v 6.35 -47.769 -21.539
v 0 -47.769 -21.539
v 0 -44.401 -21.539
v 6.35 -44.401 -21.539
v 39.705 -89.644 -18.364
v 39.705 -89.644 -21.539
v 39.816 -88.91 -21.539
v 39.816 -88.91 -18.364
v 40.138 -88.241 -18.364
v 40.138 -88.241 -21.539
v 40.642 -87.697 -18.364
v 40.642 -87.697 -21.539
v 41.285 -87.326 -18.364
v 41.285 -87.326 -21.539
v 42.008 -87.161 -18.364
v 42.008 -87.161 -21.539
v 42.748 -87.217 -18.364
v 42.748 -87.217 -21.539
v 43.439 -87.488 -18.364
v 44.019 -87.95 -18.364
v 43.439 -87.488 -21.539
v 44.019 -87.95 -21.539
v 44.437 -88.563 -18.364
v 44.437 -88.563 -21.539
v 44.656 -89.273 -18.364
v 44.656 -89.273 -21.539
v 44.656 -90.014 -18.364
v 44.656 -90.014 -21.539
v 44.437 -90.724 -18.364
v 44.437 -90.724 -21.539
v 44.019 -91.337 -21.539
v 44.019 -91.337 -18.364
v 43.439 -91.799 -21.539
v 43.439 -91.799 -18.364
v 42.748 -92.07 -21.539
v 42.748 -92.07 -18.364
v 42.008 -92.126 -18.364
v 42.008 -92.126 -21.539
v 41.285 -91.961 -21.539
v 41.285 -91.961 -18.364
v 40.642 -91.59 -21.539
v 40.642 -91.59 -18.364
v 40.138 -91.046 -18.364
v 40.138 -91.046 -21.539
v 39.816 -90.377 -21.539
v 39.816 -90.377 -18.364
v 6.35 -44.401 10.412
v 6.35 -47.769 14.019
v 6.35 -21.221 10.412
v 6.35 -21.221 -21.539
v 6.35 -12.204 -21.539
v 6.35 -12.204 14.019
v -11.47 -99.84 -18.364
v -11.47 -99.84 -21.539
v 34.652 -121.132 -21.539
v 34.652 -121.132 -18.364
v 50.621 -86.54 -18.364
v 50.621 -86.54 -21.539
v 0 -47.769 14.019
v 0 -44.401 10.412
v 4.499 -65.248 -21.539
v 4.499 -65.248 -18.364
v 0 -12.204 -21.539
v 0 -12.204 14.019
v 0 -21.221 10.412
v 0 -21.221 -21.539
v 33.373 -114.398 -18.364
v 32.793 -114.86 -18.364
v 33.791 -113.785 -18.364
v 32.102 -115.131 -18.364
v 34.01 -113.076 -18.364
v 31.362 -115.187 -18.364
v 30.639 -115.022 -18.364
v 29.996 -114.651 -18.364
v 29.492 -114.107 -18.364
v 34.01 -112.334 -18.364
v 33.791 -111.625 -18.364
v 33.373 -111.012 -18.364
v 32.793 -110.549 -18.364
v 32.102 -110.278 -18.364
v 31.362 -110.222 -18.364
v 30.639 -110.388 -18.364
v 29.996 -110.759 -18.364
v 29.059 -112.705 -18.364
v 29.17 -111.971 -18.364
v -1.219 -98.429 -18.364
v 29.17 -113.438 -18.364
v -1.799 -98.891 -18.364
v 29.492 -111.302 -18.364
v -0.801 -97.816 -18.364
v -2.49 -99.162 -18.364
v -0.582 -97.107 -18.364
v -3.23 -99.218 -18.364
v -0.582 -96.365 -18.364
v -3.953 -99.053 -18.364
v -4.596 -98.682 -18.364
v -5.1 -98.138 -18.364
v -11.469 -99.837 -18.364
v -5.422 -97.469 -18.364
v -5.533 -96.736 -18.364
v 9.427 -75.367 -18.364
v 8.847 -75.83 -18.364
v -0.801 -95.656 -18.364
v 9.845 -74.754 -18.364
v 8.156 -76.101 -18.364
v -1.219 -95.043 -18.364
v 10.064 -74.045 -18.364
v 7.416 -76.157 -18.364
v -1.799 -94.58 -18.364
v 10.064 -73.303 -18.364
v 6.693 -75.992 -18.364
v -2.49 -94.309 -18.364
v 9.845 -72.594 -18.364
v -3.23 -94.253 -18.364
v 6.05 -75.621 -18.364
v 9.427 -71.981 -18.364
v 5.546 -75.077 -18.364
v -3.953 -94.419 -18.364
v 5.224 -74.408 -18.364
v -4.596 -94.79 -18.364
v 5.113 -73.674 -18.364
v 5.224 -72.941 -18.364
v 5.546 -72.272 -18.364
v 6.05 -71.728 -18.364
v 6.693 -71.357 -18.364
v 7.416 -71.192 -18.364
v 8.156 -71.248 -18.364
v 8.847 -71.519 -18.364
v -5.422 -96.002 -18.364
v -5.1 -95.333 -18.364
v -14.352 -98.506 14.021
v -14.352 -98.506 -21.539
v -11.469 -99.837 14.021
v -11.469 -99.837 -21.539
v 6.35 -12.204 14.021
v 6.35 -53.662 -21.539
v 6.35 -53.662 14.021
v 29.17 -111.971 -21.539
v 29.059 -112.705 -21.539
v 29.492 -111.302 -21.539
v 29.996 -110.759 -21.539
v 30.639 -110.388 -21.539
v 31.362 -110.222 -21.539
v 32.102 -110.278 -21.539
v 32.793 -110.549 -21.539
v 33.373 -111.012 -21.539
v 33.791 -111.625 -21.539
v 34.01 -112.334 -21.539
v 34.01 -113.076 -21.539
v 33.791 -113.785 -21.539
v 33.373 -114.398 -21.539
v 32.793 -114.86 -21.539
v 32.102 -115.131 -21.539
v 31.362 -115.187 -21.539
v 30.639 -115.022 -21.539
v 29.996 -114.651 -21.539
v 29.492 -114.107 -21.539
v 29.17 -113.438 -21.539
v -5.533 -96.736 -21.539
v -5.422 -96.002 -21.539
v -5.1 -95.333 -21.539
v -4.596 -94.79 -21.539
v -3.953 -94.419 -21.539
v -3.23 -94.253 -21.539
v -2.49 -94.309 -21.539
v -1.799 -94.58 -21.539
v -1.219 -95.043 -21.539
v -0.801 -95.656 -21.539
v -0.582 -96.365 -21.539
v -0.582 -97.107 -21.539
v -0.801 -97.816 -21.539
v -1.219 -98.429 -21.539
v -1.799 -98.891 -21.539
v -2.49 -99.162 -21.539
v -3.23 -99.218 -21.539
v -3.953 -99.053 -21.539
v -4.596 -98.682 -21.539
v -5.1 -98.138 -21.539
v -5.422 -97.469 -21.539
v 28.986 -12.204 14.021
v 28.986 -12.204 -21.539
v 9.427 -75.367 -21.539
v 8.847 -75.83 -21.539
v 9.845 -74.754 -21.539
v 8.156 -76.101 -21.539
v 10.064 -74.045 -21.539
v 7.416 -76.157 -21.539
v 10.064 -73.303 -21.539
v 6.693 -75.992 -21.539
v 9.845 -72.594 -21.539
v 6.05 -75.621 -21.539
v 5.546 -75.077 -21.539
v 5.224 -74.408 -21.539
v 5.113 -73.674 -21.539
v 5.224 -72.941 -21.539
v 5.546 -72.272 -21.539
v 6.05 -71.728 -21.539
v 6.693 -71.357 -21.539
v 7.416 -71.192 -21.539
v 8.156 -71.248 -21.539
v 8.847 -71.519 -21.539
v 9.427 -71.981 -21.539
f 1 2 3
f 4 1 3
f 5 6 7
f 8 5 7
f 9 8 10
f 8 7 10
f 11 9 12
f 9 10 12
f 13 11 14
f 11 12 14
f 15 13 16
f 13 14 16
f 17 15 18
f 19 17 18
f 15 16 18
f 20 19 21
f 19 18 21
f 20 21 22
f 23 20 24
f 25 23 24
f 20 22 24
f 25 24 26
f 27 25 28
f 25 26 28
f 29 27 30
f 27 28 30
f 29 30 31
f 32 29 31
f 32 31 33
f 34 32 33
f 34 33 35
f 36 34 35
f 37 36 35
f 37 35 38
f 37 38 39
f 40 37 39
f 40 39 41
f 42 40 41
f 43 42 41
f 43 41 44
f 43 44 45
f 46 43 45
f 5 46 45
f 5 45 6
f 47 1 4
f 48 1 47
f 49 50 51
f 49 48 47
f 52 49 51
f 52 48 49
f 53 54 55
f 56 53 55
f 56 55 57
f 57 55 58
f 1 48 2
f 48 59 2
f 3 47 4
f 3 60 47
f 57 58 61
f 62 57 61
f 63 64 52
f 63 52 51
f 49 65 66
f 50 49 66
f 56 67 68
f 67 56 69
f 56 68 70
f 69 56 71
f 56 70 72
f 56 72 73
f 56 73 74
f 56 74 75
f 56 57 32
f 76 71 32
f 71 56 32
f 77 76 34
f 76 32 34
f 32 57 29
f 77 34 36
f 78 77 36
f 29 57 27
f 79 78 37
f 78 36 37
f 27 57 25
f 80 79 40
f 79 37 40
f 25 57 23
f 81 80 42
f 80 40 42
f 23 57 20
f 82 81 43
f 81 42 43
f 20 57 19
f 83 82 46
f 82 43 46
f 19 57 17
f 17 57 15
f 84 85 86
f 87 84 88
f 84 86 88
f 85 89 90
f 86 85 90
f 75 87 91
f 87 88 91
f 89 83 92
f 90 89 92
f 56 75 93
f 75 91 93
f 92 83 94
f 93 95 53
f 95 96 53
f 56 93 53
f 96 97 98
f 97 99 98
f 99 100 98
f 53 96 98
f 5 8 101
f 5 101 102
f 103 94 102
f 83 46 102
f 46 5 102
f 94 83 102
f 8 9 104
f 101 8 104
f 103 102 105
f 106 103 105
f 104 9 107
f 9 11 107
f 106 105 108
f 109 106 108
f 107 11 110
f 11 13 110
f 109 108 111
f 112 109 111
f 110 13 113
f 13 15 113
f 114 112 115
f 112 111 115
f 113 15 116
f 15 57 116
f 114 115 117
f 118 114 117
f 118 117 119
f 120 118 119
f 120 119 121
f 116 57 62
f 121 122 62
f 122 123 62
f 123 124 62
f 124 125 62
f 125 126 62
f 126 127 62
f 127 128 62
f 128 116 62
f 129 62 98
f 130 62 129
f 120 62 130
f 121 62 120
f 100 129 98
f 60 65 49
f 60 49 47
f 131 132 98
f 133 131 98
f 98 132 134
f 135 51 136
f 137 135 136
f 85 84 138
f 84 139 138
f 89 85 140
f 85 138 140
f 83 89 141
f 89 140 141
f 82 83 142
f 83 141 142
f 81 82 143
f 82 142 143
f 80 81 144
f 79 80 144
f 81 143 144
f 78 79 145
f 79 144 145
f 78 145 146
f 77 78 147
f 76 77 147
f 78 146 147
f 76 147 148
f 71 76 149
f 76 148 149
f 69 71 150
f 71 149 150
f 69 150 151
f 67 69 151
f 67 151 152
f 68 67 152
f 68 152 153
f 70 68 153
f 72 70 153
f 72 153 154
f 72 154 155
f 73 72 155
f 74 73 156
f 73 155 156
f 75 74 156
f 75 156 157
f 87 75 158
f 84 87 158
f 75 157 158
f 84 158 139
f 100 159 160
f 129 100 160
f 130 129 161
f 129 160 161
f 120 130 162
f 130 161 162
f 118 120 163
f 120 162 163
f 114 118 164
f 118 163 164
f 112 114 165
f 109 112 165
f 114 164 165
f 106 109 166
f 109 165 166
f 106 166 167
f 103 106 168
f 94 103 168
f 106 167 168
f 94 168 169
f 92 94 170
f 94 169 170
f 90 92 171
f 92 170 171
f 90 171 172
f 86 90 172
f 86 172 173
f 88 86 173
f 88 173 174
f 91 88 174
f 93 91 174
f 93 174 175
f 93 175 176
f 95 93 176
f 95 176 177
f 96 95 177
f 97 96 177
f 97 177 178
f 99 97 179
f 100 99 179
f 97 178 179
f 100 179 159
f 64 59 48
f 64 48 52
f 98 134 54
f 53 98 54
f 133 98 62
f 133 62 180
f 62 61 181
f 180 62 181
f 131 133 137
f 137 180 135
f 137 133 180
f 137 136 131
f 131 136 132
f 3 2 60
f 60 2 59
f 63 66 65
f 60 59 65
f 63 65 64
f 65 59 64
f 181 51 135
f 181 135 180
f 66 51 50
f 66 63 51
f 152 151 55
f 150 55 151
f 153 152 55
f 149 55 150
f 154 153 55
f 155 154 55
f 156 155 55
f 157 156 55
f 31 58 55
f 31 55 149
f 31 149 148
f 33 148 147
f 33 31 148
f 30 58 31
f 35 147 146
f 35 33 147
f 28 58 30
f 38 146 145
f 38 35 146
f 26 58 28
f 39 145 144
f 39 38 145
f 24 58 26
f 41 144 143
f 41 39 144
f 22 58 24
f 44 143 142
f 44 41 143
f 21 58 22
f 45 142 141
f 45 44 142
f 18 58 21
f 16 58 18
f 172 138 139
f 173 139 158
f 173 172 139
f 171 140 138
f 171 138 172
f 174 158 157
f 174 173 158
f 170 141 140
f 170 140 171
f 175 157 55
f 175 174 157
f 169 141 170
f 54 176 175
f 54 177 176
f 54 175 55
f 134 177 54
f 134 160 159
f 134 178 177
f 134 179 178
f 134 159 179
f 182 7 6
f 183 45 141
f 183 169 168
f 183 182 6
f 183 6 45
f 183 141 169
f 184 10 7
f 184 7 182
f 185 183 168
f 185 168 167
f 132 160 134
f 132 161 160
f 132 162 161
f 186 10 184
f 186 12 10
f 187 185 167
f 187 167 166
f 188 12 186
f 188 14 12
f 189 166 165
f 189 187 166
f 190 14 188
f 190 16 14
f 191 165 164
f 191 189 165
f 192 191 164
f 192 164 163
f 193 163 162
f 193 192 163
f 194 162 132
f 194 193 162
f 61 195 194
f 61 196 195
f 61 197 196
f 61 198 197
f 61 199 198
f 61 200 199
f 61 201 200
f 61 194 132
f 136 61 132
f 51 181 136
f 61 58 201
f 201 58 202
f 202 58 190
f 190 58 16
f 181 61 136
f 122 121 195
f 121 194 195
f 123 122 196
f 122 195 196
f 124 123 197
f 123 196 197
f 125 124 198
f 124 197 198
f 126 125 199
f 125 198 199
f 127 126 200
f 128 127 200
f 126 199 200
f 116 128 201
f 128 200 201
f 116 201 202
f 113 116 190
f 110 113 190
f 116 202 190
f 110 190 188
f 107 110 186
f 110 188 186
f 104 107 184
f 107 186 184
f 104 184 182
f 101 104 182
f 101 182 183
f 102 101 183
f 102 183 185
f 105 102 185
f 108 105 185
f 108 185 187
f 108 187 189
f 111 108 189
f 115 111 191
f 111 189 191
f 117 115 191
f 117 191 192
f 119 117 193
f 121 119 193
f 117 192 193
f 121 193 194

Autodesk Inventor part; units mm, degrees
ref_plane "YZ Plane" through (0, 0, 0) normal (1, 0, 0) x (0, 1, 0)
ref_plane "XZ Plane" through (0, 0, 0) normal (0, 1, 0) x (-1, 0, 0)
ref_plane "XY Plane" through (0, 0, 0) normal (0, 0, 1) x (1, 0, 0)
sketch "Sketch1" plane through (0, 0, 0) normal (1, 0, 0) x (0, 1, 0)
  line L0 (-12.2044, 14.0187) -> (-12.2044, -21.5388)
  line L1 (-12.2044, -21.5388) -> (-21.2212, -21.5388)
  line L2 (-21.2212, -16.1112) -> (-21.2212, 10.4119)
  line L3 (-21.2212, 14.0187) -> (-12.2044, 14.0187)
  line L4 (-47.769, -16.1112) -> (-47.769, -21.5388)
  line L5 (-47.769, -21.5388) -> (-44.4011, -21.5388)
  line L6 (-47.769, -16.1112) -> (-47.769, 14.0187)
  line L7 (-47.769, 14.0187) -> (-44.4011, 14.0187)
  line L8 (-44.4011, 10.4119) -> (-44.4011, -16.1112)
  line L9 (-21.2212, -16.1112) -> (-21.2212, -21.5388)
  line L10 (-44.4011, -16.1112) -> (-44.4011, -21.5388)
  line L11 (-21.2212, 10.4119) -> (-44.4011, 10.4119)
  line L12 (-44.4011, 14.0187) -> (-21.2212, 14.0187)
extrude "Extrusion1" add sketch "Sketch1" along normal blind 6.35
sketch "Sketch3" plane through (0, -21.2212, -21.5388) normal (0, 0, -1) x (-1, 0, 0)
  line L0 (-6.3501, 9.0172) -> (-6.3501, -26.5428)
  line L1 (-6.3501, -26.5428) -> (-6.3501, -32.4404)
  line L2 (-6.3501, -32.4404) -> (14.3519, -77.2848)
  line L3 (-6.3501, -32.4404) -> (43.0421, -32.4404) construction
  line L4 (-6.3501, 9.0172) -> (-28.9857, 9.0172)
  line L5 (14.3519, -77.2848) -> (11.4692, -78.6156)
  line L6 (11.4692, -78.6156) -> (-28.9857, 9.0172)
  dimension "d29" = 96.52
  dimension "d30" = 22.6355
  dimension "d31" = 35.56
extrude "Extrusion2" add sketch "Sketch3" against normal blind 35.56
sketch "Sketch4" plane through (0, -21.2212, -21.5388) normal (0, 0, -1) x (-1, 0, 0)
  line L0 (11.4705, -78.6183) -> (-34.652, -99.9104)
  line L1 (11.4705, -78.6183) -> (62.2705, -78.6183) construction
  line L2 (-34.652, -99.9104) -> (-50.6211, -65.3185)
  line L3 (-50.6211, -65.3185) -> (-4.4986, -44.0264)
  line L4 (-4.4986, -44.0264) -> (11.4705, -78.6183)
  line L5 (-50.6211, -65.3185) -> (-47.3708, -72.3592)
  circle A0 centre (-42.1943, -68.4223) radius 2.4892
  circle A1 centre (-7.6024, -52.4532) radius 2.4892
  circle A2 centre (3.0437, -75.5145) radius 2.4892
  circle A3 centre (-31.5482, -91.4835) radius 2.4892
  dimension "d15" = 50.8
  dimension "d16" = 155.22
  dimension "d17" = 38.1
  dimension "d25" = 4.9784
  dimension "d26" = 4.9784
  dimension "d27" = 4.9784
  dimension "d28" = 4.9784
  dimension "d32" = 6.35
  dimension "d34" = 6.35
  dimension "d35" = 6.35
  dimension "d37" = 6.35
  dimension "d38" = 6.35
  dimension "d40" = 6.35
  dimension "d42" = 6.35
  dimension "d44" = 6.35
extrude "Extrusion3" add sketch "Sketch4" against normal blind 3.175
properties part number "back mount"
